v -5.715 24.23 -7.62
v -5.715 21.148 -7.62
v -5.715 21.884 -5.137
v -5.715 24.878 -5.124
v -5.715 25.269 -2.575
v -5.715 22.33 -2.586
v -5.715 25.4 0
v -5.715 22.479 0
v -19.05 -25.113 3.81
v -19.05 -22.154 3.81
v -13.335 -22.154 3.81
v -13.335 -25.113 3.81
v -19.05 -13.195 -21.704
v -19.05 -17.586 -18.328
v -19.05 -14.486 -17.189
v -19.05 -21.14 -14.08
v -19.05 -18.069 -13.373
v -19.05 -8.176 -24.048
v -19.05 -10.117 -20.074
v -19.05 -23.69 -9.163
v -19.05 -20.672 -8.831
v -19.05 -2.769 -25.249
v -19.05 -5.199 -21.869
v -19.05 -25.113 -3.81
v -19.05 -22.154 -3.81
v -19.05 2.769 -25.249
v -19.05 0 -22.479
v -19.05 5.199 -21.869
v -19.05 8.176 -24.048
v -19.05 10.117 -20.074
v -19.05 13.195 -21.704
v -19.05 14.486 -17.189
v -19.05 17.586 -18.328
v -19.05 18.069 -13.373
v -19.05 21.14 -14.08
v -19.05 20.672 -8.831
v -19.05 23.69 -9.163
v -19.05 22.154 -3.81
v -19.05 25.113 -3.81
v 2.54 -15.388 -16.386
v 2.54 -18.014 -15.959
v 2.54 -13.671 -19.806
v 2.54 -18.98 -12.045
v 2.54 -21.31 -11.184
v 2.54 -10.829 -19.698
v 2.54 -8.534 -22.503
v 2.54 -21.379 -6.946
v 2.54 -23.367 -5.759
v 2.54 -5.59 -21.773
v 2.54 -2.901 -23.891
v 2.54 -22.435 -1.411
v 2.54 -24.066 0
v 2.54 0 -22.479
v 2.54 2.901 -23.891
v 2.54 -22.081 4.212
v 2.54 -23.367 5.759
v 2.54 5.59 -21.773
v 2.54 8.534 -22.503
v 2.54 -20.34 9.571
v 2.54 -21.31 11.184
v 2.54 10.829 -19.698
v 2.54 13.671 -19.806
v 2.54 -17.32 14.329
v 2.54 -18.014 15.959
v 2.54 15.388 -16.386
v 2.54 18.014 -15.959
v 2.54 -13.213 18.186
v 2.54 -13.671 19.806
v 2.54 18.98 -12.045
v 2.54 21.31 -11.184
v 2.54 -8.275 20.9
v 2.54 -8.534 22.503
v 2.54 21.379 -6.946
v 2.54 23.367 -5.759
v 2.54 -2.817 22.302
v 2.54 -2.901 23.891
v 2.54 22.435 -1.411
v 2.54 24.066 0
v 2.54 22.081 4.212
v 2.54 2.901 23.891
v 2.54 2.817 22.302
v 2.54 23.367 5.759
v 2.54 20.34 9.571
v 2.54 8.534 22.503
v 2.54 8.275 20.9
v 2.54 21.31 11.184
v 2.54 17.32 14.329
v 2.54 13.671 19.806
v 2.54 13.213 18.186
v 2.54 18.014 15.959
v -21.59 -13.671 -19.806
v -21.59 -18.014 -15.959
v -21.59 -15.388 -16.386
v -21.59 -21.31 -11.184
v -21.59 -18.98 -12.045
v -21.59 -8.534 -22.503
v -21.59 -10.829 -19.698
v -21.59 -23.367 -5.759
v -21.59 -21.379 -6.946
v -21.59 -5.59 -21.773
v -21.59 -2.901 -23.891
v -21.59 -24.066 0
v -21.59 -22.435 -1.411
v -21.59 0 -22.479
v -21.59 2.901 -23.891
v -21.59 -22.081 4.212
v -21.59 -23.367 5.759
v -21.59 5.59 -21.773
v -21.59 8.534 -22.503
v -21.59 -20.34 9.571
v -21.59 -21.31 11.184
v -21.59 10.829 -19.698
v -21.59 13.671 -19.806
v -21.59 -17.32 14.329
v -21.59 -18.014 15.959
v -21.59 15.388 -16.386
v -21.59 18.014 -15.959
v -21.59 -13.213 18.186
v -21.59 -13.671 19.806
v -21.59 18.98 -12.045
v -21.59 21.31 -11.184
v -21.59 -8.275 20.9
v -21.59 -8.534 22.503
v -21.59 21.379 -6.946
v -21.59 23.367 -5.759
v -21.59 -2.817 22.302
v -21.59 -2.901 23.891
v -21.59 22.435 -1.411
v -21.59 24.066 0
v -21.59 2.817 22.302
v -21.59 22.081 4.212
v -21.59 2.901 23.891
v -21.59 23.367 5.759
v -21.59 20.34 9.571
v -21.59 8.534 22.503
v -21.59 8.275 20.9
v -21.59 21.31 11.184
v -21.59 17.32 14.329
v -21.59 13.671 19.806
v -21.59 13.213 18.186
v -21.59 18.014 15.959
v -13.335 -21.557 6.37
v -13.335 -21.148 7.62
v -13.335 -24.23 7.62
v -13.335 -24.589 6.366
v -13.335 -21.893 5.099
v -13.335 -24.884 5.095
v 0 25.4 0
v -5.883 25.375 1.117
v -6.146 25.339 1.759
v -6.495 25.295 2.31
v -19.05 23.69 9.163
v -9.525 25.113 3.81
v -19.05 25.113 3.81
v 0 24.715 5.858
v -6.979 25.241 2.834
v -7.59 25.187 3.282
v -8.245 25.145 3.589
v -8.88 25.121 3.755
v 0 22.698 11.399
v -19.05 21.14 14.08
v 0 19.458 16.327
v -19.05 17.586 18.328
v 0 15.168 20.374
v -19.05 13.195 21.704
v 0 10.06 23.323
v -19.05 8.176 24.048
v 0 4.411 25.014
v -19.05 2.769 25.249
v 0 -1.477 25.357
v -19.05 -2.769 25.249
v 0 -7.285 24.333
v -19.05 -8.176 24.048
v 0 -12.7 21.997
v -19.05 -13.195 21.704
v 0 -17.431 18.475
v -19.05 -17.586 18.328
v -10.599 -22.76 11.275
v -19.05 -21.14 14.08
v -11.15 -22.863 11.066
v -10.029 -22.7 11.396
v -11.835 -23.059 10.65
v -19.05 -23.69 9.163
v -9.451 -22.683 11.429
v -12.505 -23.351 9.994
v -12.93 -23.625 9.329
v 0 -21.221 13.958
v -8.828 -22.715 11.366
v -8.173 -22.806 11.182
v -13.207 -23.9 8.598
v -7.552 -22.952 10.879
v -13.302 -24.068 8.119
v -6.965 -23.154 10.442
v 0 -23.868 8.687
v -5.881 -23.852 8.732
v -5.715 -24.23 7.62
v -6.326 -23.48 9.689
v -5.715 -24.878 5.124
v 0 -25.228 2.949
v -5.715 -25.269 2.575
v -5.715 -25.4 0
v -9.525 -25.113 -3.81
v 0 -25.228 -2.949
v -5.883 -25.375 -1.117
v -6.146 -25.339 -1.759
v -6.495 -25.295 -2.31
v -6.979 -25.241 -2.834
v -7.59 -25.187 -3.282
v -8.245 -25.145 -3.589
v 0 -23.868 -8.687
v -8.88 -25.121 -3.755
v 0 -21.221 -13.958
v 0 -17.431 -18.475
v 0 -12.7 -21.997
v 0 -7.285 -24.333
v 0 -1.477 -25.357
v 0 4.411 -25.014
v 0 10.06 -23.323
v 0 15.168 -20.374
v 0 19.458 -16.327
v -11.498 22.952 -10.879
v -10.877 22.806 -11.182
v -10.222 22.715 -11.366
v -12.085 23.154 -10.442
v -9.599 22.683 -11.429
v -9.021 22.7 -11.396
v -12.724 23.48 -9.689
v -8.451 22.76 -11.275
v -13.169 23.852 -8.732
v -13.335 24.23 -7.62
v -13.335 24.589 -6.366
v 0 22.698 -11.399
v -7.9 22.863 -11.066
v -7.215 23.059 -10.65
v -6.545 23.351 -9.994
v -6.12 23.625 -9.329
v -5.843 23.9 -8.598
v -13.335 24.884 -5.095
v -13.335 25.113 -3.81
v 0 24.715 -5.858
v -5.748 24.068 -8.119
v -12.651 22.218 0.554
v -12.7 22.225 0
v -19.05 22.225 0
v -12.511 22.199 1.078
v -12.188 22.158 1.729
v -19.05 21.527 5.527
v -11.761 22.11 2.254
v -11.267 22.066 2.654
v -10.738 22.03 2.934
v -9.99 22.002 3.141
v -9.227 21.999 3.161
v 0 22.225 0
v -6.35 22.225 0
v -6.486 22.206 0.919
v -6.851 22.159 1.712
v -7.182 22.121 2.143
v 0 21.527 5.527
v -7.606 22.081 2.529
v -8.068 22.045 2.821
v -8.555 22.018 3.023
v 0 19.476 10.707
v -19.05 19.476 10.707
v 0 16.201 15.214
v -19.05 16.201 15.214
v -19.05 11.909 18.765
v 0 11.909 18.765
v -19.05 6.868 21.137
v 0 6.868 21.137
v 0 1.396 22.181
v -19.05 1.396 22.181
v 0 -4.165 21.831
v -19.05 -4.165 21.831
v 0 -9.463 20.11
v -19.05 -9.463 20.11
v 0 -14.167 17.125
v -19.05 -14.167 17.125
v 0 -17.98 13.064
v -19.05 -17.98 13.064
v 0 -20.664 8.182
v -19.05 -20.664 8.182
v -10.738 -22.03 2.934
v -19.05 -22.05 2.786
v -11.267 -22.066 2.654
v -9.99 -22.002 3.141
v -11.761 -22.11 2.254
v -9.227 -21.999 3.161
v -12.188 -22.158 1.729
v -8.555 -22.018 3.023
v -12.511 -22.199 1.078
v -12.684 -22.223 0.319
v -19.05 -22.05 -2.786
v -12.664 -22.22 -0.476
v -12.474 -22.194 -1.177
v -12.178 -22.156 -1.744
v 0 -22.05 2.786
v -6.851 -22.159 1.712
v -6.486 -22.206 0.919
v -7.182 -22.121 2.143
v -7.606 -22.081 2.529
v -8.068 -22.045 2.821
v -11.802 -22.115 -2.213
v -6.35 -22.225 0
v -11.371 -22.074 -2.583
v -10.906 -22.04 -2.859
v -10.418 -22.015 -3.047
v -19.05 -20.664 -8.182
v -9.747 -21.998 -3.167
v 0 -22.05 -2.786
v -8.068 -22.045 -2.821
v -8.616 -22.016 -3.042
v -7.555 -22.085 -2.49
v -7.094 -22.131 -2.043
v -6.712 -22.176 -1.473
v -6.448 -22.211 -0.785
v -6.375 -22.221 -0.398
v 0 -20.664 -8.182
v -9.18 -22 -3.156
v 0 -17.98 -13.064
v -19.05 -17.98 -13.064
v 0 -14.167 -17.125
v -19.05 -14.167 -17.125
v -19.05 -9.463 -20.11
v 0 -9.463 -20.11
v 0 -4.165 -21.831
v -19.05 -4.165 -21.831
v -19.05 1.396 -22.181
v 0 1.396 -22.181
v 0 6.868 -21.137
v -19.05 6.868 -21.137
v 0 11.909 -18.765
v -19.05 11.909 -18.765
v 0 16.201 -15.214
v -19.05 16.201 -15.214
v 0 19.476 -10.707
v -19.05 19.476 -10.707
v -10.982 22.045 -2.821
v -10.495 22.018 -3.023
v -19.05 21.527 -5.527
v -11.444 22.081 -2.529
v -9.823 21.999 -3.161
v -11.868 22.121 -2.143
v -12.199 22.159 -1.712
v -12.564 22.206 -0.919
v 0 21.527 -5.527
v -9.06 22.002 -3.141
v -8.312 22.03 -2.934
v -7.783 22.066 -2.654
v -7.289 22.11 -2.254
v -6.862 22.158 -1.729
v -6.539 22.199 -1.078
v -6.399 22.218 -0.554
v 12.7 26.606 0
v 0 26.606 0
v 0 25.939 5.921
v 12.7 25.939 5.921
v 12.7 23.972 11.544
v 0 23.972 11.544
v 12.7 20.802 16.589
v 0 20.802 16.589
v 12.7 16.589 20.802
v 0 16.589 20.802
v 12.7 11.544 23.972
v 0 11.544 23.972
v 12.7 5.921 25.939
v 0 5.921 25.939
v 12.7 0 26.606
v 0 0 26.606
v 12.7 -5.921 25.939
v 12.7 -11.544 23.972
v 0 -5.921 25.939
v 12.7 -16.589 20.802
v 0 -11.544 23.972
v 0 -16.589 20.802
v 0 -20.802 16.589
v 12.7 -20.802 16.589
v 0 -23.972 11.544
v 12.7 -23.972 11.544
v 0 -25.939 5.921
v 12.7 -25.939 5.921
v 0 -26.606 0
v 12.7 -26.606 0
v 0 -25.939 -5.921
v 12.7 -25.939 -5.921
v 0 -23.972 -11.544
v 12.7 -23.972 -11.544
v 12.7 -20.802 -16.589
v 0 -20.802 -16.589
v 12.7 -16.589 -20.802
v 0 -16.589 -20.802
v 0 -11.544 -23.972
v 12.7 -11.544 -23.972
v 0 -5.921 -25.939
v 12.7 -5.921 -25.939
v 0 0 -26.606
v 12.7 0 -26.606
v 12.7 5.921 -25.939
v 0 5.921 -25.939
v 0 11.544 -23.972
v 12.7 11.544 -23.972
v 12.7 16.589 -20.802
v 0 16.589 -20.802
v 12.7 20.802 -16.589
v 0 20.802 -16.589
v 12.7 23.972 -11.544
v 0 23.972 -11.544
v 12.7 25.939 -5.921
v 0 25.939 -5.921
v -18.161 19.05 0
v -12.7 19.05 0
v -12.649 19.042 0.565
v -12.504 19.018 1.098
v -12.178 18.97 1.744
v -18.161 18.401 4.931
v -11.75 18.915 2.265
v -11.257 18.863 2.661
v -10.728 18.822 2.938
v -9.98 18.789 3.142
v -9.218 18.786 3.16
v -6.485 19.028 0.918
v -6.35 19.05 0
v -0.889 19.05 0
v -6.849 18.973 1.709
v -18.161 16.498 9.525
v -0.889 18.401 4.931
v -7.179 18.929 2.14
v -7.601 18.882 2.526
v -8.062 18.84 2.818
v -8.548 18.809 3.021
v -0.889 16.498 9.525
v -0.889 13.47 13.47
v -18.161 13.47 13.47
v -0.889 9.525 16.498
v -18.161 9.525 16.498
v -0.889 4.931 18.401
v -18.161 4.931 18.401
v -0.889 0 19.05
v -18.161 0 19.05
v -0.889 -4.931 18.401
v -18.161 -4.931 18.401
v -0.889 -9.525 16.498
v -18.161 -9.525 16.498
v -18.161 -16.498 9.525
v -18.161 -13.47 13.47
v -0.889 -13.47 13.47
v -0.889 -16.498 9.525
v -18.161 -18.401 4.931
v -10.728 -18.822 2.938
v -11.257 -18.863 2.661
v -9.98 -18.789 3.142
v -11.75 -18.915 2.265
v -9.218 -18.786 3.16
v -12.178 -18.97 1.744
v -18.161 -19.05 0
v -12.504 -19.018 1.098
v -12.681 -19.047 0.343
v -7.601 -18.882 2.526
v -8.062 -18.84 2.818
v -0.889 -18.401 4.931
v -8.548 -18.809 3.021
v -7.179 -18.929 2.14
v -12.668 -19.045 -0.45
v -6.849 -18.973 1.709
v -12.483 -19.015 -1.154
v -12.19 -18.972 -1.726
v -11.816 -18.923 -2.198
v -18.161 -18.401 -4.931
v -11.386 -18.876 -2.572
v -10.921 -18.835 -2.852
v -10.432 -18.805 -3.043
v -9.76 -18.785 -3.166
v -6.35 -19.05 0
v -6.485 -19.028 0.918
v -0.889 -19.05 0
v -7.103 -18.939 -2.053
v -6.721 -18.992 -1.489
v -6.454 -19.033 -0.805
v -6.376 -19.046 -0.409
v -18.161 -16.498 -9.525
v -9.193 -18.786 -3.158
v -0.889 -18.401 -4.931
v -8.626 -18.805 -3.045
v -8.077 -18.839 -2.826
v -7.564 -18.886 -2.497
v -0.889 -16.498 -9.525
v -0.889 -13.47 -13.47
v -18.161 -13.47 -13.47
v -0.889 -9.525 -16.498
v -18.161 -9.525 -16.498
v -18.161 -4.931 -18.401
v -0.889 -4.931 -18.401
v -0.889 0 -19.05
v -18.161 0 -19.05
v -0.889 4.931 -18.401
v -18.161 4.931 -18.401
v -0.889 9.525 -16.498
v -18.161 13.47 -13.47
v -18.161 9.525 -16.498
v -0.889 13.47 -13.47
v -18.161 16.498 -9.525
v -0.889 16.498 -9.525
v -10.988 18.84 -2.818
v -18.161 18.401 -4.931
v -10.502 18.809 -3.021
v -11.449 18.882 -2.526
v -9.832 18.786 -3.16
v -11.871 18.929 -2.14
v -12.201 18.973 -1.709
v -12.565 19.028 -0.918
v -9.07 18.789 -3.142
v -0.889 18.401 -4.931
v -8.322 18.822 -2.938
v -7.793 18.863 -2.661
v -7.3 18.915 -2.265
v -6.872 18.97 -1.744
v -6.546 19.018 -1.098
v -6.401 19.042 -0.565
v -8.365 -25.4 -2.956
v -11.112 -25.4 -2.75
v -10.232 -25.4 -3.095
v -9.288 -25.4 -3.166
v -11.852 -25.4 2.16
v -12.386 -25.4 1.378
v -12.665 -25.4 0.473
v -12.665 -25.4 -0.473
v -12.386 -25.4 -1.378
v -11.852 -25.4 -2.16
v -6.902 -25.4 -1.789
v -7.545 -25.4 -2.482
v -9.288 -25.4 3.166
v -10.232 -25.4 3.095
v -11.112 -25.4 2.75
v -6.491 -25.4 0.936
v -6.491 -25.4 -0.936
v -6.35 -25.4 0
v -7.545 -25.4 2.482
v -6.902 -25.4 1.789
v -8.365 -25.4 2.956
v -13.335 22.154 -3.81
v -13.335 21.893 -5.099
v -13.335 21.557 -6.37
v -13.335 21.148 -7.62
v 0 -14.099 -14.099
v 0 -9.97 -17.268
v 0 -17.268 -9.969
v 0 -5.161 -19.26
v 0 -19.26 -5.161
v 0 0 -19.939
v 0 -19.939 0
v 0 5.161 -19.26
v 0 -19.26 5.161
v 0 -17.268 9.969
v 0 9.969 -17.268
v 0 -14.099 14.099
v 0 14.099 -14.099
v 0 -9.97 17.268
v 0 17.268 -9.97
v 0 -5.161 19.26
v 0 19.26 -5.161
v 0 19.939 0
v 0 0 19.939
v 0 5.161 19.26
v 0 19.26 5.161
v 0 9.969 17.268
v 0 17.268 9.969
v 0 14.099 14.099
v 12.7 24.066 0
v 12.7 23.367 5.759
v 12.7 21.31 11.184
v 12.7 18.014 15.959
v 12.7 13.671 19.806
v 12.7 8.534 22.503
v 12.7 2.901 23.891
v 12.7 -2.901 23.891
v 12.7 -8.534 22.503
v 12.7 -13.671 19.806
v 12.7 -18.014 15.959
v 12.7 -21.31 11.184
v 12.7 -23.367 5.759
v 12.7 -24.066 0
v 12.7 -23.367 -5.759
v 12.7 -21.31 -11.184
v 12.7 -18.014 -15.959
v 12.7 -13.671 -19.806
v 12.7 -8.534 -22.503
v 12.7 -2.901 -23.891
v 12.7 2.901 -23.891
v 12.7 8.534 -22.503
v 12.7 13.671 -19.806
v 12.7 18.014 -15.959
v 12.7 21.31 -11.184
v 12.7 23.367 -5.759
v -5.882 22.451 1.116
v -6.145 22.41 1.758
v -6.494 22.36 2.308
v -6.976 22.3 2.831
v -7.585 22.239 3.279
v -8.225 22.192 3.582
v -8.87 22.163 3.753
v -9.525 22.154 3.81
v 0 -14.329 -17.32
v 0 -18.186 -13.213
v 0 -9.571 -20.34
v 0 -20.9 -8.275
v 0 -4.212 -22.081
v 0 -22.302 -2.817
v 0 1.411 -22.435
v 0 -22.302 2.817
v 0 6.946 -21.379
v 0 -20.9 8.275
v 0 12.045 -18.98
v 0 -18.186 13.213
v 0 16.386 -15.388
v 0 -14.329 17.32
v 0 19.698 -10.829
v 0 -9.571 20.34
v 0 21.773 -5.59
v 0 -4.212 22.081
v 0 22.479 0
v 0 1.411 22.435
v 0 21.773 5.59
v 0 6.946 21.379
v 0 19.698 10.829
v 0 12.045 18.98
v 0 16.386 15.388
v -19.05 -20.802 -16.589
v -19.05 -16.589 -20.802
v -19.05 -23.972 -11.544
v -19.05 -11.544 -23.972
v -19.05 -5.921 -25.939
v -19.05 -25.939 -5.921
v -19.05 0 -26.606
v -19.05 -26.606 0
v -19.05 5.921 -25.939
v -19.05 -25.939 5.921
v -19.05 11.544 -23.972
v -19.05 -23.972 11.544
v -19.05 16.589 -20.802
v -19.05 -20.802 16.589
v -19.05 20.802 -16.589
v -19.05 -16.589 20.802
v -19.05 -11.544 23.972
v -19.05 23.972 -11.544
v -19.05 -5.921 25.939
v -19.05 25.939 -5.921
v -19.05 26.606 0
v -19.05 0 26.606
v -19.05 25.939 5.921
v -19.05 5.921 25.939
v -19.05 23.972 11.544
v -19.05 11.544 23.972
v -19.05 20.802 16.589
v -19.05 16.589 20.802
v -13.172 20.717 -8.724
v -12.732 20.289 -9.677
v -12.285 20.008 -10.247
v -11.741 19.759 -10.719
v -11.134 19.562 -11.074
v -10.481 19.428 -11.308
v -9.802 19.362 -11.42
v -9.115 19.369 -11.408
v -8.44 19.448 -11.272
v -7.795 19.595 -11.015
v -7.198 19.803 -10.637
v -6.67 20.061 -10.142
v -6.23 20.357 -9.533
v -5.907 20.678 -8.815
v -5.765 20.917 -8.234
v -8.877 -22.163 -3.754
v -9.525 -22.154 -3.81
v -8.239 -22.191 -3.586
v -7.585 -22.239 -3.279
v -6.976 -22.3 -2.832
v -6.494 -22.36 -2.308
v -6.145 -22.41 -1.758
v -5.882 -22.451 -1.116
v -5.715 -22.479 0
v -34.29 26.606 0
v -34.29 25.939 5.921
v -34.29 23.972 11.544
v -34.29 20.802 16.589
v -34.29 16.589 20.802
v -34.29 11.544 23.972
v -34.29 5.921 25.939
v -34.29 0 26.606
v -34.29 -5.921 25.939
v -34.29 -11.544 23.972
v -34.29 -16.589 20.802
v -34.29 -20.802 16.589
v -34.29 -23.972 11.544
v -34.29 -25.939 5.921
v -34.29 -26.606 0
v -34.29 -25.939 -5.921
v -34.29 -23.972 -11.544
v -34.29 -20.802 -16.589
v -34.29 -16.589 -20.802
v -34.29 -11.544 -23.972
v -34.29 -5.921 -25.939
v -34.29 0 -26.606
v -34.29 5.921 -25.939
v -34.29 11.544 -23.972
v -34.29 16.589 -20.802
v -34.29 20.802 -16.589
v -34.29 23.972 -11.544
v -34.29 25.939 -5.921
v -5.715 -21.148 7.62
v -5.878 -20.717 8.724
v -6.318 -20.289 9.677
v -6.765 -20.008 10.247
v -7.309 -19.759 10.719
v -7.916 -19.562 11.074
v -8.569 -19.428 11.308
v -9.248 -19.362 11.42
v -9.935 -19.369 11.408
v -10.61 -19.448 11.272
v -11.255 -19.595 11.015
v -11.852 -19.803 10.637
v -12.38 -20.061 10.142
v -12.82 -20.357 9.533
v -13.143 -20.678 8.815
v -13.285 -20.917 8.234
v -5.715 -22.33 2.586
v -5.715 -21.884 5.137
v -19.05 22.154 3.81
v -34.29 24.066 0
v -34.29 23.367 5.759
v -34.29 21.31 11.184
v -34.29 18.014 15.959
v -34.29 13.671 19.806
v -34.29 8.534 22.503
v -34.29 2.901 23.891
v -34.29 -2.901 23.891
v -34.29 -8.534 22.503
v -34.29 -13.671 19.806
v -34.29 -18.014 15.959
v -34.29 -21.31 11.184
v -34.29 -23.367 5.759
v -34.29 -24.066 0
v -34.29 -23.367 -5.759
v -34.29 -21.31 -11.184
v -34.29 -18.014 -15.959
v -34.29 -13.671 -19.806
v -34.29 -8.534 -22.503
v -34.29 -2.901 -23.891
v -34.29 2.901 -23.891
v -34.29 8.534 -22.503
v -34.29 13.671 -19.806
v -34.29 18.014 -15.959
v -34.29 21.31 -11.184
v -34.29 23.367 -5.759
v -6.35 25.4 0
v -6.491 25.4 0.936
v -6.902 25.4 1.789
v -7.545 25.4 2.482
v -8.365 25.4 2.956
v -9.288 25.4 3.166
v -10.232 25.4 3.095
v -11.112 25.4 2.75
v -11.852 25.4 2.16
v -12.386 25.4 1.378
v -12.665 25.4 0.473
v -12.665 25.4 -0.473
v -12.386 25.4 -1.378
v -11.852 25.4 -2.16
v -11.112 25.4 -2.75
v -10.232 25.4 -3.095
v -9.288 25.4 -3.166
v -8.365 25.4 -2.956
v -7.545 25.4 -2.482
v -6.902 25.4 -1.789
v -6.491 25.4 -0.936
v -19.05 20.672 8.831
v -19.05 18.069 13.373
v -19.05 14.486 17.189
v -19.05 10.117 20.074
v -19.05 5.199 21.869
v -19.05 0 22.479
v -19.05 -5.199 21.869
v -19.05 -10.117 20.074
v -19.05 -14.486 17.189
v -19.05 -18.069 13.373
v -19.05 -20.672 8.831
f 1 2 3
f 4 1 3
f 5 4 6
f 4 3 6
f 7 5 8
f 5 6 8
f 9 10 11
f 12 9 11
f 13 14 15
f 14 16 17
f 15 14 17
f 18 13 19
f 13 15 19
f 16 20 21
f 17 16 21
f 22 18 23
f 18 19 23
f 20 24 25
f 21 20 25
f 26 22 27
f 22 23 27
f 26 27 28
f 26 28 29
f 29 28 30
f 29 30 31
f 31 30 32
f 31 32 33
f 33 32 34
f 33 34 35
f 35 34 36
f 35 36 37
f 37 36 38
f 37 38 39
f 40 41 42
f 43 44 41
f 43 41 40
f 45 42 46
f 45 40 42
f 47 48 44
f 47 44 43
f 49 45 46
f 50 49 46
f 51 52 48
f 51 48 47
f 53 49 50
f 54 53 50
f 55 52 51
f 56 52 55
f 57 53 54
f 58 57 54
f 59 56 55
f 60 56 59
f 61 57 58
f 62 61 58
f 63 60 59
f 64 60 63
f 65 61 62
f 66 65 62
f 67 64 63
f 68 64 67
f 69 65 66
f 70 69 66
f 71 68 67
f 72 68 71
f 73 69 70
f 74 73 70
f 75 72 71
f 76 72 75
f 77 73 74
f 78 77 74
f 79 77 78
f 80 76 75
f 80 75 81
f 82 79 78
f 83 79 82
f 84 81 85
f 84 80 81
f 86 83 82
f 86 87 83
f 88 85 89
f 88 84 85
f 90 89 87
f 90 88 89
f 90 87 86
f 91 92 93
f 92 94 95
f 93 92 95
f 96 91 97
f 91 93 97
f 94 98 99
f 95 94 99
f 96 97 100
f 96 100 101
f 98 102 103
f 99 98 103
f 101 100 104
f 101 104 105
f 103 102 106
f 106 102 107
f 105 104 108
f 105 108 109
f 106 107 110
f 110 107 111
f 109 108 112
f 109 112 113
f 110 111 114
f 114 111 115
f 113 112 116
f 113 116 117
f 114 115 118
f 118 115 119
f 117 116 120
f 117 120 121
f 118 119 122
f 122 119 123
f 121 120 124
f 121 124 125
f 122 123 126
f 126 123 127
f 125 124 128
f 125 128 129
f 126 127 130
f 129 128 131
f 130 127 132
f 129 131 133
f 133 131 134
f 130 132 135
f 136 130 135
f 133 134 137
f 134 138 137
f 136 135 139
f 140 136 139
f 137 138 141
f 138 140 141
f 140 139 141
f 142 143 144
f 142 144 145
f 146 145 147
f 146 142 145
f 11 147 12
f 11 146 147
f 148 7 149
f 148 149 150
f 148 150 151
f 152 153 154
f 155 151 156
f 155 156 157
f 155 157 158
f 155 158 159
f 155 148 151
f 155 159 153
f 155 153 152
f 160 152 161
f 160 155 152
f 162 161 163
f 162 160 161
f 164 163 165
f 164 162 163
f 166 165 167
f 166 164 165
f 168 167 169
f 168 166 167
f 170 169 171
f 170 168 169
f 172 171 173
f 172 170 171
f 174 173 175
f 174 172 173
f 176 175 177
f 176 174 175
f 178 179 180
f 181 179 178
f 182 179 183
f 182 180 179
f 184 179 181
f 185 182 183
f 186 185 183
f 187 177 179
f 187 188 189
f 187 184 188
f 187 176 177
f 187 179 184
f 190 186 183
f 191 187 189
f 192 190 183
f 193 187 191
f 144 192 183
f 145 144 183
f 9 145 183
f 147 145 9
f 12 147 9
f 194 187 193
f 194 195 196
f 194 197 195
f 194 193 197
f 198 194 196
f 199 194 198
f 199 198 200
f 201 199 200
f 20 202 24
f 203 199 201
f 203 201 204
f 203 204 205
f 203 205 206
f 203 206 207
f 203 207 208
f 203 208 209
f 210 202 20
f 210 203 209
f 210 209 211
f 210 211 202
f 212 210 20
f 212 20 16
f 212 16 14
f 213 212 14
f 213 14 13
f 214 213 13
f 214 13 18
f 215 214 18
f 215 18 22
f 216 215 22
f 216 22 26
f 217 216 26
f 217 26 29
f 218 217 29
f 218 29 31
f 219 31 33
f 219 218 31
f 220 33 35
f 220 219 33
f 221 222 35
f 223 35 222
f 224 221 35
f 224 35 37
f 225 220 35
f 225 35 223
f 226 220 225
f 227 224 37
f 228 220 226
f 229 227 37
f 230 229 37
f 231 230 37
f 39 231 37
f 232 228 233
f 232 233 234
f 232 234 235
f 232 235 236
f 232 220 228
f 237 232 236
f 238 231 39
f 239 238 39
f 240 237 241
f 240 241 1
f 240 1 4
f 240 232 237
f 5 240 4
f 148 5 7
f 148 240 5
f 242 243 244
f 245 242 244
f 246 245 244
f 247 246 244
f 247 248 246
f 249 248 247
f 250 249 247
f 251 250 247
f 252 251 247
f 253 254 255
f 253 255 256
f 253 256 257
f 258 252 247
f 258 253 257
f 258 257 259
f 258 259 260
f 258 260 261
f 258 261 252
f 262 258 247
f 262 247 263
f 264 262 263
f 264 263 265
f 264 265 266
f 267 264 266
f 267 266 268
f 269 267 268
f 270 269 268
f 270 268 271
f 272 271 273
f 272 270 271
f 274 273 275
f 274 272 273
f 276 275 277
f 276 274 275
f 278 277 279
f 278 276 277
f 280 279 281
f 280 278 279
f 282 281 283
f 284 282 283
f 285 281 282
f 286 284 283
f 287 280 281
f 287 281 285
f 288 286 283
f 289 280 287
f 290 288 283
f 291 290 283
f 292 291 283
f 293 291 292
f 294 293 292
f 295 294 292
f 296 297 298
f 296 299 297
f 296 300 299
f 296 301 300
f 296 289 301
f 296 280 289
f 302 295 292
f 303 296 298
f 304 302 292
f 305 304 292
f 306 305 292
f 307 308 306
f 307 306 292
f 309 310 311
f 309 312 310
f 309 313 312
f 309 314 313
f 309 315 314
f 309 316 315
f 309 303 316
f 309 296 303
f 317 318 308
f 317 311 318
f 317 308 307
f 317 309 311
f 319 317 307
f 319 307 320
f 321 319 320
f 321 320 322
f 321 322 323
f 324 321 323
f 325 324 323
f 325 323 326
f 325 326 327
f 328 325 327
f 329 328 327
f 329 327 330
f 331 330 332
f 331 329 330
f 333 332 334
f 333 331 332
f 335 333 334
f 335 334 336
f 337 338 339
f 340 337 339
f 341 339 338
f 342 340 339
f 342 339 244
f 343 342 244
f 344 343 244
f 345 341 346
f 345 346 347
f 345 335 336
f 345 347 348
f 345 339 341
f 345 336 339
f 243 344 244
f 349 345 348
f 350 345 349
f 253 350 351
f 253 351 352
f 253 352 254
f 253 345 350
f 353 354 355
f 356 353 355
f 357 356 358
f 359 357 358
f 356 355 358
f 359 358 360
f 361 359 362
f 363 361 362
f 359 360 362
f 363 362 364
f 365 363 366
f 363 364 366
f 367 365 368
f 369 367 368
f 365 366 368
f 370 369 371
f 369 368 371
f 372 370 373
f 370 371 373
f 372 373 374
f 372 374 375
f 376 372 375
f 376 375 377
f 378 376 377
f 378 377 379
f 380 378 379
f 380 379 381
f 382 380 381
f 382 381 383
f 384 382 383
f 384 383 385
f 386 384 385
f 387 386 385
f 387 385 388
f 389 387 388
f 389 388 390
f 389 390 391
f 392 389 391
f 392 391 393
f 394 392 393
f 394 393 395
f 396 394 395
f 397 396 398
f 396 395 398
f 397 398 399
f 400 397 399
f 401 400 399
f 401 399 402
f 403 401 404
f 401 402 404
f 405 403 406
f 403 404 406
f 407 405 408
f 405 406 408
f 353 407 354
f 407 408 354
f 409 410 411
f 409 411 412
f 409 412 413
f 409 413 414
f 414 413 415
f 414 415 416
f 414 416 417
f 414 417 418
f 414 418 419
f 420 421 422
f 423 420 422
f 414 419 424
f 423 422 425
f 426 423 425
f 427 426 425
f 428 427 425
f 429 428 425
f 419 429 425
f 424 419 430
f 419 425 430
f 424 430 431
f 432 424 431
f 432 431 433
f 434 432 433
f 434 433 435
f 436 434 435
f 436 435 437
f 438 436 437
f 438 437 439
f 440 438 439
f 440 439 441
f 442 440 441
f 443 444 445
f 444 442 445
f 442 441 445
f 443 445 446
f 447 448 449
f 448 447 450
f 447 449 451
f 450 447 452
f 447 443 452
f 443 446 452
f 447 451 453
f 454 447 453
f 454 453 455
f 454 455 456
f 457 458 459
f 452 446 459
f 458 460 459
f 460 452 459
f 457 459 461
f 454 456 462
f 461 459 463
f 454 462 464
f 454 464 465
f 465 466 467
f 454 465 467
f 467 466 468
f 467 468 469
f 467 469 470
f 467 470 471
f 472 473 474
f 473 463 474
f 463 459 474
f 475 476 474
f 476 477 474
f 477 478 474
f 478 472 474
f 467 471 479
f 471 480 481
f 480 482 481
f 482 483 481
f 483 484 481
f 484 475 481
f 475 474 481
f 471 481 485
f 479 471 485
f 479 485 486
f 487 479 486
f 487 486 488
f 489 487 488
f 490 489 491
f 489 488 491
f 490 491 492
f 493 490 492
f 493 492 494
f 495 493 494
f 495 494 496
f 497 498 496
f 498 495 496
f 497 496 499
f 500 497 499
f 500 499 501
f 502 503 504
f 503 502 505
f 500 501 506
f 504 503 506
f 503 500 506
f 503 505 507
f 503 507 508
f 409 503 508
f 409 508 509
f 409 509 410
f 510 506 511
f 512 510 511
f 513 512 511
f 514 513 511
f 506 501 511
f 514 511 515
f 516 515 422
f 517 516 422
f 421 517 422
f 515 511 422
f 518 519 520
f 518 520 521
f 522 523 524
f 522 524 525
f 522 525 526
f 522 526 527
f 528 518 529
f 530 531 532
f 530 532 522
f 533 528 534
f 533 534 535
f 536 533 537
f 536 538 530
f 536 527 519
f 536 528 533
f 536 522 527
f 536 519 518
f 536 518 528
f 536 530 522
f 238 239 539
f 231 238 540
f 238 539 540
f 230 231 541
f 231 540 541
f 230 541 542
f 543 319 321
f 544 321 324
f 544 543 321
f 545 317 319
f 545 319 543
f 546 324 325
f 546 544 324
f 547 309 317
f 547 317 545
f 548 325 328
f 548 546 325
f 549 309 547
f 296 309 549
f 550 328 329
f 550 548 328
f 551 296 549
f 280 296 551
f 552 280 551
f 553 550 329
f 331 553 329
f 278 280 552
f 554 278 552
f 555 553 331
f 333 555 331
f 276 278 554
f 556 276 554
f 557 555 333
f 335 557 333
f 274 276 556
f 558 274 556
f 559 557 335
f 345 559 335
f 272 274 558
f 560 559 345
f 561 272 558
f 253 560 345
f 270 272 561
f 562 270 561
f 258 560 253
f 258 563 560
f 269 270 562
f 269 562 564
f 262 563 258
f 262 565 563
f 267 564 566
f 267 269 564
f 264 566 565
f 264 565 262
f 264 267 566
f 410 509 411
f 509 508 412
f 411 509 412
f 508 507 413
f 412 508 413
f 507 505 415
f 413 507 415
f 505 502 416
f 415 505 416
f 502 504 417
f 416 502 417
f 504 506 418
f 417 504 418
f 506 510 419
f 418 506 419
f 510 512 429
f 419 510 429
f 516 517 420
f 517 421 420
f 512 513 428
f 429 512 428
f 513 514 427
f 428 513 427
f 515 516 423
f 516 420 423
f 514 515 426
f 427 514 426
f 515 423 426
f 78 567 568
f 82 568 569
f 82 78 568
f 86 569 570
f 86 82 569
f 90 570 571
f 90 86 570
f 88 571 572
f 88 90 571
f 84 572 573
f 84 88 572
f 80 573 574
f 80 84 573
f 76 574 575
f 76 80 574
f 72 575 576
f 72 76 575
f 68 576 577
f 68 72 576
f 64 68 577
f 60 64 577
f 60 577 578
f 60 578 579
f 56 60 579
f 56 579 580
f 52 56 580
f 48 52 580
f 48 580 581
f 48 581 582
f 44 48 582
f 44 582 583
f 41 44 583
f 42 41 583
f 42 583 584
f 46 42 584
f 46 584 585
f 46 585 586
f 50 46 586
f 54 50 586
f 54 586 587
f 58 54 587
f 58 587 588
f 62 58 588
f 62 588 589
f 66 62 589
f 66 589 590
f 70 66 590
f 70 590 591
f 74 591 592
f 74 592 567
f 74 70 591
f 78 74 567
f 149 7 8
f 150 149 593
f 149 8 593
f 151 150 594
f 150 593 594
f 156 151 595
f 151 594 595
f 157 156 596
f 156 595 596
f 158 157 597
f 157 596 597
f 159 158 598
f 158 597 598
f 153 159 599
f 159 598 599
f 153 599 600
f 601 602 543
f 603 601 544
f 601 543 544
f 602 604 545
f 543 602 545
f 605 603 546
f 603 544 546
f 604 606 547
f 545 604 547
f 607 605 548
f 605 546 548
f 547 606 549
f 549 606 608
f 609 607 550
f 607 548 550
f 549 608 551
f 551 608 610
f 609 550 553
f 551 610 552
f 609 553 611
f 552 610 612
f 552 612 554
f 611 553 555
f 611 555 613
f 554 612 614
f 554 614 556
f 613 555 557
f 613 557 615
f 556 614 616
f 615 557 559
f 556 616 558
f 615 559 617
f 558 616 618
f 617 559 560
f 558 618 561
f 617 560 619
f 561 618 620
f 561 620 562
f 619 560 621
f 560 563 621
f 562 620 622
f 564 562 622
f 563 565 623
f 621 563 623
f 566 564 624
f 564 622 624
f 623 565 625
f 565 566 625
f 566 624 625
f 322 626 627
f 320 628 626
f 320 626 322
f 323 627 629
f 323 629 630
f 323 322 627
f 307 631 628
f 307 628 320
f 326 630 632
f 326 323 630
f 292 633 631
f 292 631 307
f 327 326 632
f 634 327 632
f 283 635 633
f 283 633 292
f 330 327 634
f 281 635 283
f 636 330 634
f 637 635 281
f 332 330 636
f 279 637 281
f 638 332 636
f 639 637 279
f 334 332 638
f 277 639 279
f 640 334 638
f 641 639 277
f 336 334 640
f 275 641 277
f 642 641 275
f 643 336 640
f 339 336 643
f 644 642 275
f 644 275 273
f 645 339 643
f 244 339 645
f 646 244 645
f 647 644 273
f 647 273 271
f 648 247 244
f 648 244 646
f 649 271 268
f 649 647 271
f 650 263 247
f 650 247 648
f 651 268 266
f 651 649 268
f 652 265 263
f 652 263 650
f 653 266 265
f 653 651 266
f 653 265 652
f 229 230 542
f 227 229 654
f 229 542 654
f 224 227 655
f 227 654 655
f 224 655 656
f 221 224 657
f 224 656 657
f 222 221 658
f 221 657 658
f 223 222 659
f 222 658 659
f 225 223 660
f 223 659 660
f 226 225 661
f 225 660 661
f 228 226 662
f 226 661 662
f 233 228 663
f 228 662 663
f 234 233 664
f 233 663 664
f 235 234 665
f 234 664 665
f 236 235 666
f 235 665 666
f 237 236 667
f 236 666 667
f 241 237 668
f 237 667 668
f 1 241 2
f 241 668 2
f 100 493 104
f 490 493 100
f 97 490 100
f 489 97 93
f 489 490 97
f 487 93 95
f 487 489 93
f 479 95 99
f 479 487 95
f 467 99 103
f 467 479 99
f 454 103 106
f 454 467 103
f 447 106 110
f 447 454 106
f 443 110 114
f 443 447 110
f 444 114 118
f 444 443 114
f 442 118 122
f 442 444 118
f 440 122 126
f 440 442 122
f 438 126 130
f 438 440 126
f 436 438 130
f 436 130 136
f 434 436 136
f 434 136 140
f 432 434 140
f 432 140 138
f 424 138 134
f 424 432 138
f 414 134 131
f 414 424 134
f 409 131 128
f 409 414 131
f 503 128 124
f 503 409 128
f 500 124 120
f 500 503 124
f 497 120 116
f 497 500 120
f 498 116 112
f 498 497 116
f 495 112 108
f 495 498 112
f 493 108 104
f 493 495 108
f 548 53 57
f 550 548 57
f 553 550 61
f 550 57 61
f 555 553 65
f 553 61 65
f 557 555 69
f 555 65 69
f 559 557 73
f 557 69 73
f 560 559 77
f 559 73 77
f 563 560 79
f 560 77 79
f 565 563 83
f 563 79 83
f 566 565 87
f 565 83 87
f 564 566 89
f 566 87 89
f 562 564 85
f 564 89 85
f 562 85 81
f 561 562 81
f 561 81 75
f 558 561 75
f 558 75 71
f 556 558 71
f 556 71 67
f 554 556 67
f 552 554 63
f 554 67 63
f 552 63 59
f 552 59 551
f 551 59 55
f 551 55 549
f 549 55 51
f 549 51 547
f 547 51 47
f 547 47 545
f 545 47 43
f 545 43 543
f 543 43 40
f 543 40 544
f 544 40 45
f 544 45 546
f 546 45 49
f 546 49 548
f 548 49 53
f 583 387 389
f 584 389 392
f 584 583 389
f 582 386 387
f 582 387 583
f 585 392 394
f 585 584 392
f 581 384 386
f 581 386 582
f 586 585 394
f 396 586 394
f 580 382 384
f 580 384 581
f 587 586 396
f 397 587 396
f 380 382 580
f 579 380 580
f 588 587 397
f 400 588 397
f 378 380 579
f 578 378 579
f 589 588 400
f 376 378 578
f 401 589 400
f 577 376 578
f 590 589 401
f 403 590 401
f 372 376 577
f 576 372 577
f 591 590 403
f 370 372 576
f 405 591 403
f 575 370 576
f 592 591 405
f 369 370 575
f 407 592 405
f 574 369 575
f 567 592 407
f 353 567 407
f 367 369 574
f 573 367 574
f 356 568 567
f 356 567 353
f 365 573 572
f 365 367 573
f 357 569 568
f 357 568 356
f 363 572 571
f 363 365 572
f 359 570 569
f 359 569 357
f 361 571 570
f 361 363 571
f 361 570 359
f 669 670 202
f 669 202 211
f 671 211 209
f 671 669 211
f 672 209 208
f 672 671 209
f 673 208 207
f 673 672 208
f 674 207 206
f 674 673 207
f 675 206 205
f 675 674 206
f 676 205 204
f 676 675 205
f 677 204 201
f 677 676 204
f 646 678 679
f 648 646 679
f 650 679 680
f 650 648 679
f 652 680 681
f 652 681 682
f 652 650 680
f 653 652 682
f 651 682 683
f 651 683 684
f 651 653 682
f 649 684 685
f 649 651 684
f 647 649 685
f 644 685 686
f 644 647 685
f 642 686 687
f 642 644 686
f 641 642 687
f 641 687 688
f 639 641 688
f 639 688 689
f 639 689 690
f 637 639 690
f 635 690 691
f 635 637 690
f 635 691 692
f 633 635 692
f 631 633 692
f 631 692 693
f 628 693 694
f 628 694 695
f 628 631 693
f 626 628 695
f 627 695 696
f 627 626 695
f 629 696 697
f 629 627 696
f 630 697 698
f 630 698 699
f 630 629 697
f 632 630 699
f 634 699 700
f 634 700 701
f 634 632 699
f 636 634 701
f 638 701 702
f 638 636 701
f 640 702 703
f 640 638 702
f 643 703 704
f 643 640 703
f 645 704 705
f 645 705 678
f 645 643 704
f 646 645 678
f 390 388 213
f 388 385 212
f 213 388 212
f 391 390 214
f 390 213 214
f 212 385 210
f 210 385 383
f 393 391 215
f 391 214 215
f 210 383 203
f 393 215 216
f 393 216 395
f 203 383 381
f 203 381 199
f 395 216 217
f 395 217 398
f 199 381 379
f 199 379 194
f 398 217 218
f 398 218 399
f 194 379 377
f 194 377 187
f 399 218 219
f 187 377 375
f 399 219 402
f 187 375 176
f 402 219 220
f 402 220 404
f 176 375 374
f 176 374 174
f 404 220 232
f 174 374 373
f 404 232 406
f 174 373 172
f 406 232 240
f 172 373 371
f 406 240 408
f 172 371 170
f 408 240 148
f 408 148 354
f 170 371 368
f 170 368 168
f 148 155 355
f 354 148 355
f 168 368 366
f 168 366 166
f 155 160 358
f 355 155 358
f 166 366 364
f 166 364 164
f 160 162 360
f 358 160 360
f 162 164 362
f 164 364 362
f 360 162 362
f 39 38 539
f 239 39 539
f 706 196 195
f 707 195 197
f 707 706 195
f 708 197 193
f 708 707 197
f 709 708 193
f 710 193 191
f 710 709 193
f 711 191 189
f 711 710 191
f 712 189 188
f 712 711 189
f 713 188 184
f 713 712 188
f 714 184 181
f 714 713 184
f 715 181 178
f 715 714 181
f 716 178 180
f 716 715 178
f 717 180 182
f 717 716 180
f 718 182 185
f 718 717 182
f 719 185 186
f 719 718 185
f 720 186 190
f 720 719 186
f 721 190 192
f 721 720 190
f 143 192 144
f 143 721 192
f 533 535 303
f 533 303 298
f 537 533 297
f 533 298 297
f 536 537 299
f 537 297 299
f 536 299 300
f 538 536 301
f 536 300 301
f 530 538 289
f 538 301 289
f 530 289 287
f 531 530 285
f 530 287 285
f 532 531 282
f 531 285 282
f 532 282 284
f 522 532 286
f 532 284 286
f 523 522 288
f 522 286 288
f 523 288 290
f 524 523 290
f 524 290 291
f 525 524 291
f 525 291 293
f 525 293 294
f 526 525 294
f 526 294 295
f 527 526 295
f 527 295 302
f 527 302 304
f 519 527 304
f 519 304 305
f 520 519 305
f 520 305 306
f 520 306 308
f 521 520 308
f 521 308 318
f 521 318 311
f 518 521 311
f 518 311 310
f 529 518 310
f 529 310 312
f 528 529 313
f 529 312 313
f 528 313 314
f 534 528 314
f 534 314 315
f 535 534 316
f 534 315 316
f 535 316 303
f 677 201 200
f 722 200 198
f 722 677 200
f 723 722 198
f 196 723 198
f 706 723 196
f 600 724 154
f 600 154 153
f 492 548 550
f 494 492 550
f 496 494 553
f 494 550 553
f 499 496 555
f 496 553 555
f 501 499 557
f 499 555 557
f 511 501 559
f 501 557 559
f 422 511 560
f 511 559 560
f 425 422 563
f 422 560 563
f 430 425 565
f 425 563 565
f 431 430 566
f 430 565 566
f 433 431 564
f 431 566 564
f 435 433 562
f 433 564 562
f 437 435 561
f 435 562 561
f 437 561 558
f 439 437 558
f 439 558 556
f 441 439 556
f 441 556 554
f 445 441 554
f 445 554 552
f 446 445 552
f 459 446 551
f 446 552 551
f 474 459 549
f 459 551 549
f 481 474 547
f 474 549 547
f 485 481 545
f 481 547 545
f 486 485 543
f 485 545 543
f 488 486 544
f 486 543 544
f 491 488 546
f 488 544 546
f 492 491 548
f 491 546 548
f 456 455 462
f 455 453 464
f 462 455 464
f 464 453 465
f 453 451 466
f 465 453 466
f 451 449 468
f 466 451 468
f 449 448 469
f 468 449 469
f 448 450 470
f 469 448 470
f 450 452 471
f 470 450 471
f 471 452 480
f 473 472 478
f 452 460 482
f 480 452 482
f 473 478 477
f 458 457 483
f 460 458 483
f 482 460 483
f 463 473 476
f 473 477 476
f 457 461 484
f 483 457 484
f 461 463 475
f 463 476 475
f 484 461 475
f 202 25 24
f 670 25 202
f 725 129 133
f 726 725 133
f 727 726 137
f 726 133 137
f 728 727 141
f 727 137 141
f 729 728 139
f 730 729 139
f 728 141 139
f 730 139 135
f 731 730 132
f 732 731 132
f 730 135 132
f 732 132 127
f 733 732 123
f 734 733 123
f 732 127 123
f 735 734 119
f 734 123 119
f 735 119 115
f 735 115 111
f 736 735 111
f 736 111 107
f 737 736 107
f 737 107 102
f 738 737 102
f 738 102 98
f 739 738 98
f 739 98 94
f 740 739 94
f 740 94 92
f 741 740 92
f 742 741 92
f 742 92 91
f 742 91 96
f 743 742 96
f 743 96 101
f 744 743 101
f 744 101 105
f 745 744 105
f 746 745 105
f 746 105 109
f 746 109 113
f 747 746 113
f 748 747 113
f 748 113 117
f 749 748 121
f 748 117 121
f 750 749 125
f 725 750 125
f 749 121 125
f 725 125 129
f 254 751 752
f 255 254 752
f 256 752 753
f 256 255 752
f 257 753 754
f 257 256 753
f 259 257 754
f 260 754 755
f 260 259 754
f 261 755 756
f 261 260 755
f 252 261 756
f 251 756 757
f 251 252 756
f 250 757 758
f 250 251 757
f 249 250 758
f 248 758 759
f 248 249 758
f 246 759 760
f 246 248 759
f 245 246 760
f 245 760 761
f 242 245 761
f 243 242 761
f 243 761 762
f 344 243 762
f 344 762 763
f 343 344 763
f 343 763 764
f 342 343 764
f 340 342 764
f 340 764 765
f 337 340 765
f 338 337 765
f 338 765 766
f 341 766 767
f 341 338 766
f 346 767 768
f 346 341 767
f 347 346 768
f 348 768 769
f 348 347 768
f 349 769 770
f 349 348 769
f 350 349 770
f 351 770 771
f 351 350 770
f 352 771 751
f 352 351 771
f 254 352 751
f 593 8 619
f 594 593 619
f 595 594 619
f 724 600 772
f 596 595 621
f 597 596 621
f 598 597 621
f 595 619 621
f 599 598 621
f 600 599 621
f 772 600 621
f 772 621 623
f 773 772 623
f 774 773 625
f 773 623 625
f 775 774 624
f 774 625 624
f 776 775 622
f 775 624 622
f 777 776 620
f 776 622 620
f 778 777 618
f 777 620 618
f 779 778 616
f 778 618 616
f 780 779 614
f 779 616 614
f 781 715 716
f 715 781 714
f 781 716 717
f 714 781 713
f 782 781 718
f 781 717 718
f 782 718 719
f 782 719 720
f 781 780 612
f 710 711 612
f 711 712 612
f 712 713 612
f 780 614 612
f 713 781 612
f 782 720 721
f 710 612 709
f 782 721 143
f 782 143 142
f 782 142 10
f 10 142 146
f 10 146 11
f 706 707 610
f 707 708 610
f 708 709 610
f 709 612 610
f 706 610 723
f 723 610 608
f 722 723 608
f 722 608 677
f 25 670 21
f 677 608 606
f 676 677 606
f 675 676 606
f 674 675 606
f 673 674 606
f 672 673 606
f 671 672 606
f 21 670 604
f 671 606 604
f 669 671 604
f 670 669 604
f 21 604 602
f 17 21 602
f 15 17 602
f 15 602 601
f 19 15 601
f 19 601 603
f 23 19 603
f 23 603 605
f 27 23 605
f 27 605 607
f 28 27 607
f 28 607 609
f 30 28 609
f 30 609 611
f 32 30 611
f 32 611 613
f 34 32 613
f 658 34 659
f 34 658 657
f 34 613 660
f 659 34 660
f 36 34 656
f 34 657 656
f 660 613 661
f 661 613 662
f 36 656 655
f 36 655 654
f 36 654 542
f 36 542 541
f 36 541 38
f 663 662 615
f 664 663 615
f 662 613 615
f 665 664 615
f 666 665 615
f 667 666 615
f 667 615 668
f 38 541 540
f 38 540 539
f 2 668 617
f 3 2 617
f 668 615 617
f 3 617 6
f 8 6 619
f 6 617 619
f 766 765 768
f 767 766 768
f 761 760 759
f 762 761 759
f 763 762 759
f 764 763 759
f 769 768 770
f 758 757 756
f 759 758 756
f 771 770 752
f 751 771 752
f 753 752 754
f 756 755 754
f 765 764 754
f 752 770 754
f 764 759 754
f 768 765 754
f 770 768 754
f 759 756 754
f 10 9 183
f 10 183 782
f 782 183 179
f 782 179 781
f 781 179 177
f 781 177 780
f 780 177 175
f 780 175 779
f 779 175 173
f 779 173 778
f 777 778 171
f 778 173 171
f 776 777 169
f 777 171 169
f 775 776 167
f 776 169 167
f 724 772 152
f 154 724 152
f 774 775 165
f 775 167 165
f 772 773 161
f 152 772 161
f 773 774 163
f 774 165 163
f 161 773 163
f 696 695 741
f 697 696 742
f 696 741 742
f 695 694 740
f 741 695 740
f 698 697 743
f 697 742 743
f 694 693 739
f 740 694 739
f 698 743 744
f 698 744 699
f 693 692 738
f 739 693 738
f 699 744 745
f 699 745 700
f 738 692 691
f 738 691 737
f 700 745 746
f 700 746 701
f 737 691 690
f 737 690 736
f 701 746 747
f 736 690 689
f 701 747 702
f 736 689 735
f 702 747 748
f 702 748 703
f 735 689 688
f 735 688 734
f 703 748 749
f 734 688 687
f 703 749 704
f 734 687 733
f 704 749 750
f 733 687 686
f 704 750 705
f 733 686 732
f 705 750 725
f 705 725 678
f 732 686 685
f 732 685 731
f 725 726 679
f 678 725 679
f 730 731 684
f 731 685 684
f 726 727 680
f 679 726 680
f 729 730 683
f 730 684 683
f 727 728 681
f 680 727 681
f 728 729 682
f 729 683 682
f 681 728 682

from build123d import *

# Parameters (mm, degrees)
F0_R           = 26.6065
F0_R_2         = 24.0665
F0_R_3         = 19.05
F1_DEPTH       = 2.54
F2_DEPTH       = 12.7
F3_R           = 25.4
F3_R_2         = 22.479
F4_DEPTH       = 19.05
F5_W           = 9.525
F5_H           = 7.62
F6_DEPTH       = 50.8
F6_DEPTH_BACK  = 50.8
F7_R           = 3.81
F8_DEPTH       = 50.8
F8_DEPTH_BACK  = 50.8
F10_DEPTH      = 50.8
F12_DEPTH      = 25.4
F13_R          = 22.225
F13_R_2        = 19.05
F14_DEPTH      = 21.59
F15_START      = -19.05
F13_R_3        = 24.0665
F15_DEPTH      = 2.54
F17_START      = -19.05
F16_R          = 26.6065
F16_R_2        = 24.0665
F17_DEPTH      = 15.24
F18_R          = 3.175
F19_DEPTH      = 25.4
F19_DEPTH_BACK = 25.4
F20_DEPTH      = 25.4
F21_W          = 2.54
F21_H          = 0.889


with BuildPart() as f1:
    # F0 (on Right) → F1 (new body)
    with BuildSketch(Plane.YZ):
        Circle(F0_R)
        Circle(F0_R_2, mode=Mode.SUBTRACT)
        Circle(F0_R_2)
        Circle(F0_R_3, mode=Mode.SUBTRACT)
    extrude(amount=F1_DEPTH)

    # F0 (on Right) → F2 (join)
    with BuildSketch(Plane.YZ):
        Circle(F0_R)
        Circle(F0_R_2, mode=Mode.SUBTRACT)
    extrude(amount=F2_DEPTH)

    # F3 (on Right) → F4 (join)
    with BuildSketch(Plane.YZ):
        Circle(F3_R)
        Circle(F3_R_2, mode=Mode.SUBTRACT)
    extrude(amount=-F4_DEPTH)

    # F5 (on Front) → F6 (cut, two sides)
    with BuildSketch(Plane.XZ) as f6_sk:
        with Locations((-14.2875, 0)):
            Rectangle(F5_W, F5_H)
    extrude(amount=-F6_DEPTH, mode=Mode.SUBTRACT)
    extrude(f6_sk.sketch, amount=F6_DEPTH_BACK, mode=Mode.SUBTRACT)

    # F7 (on Front) → F8 (cut, two sides)
    with BuildSketch(Plane.XZ) as f8_sk:
        with Locations((-9.525, 0)):
            Circle(F7_R)
    extrude(amount=-F8_DEPTH, mode=Mode.SUBTRACT)
    extrude(f8_sk.sketch, amount=F8_DEPTH_BACK, mode=Mode.SUBTRACT)

    # F9 (on Front) → F10 (cut)
    with BuildSketch(Plane.XZ):
        with BuildLine():
            ThreePointArc((-13.335, 7.62), (-9.525, 3.81), (-5.715, 7.62))
            ThreePointArc((-5.715, 7.62), (-9.525, 11.43), (-13.335, 7.62))
        make_face()
        with BuildLine():
            Line((-5.715, 0), (-5.715, 7.62))
            ThreePointArc((-5.715, 7.62), (-9.525, 3.81), (-13.335, 7.62))
            Line((-13.335, 7.62), (-13.335, 0))
            Line((-13.335, 0), (-5.715, 0))
        make_face()
    extrude(amount=F10_DEPTH, mode=Mode.SUBTRACT)

    # F11 (on Front) → F12 (cut)
    with BuildSketch(Plane.XZ):
        with BuildLine():
            ThreePointArc((-13.335, -7.62), (-9.525, -3.81), (-5.715, -7.62))
            Line((-5.715, -7.62), (-5.715, 0))
            Line((-5.715, 0), (-13.335, 0))
            Line((-13.335, 0), (-13.335, -7.62))
        make_face()
        with BuildLine():
            ThreePointArc((-13.335, -7.62), (-9.525, -11.43), (-5.715, -7.62))
            ThreePointArc((-5.715, -7.62), (-9.525, -3.81), (-13.335, -7.62))
        make_face()
    extrude(amount=-F12_DEPTH, mode=Mode.SUBTRACT)


with BuildPart() as f14:
    # F13 (on Right) → F14 (new body)
    with BuildSketch(Plane.YZ):
        Circle(F13_R)
        Circle(F13_R_2, mode=Mode.SUBTRACT)
    extrude(amount=-F14_DEPTH)

    # F13 (on Right) → F15 (join)
    with BuildSketch(Plane.YZ.offset(F15_START)):
        Circle(F13_R_3)
        Circle(F13_R, mode=Mode.SUBTRACT)
    extrude(amount=-F15_DEPTH)

    # F16 (on Right) → F17 (join)
    with BuildSketch(Plane.YZ.offset(F17_START)):
        Circle(F16_R)
        Circle(F16_R_2, mode=Mode.SUBTRACT)
    extrude(amount=-F17_DEPTH)

    # F18 (on Front) → F19 (join, two sides)
    with BuildSketch(Plane.XZ) as f19_sk:
        with Locations((-9.525, 0)):
            Circle(F18_R)
    extrude(amount=F19_DEPTH)
    extrude(f19_sk.sketch, amount=-F19_DEPTH_BACK)

    # F13 (on Right) → F20 (cut)
    with BuildSketch(Plane.YZ):
        Circle(F13_R_2)
    extrude(amount=-F20_DEPTH, mode=Mode.SUBTRACT)


with BuildPart() as f22_tool:
    # F21 (on Front) → F22 (revolve)
    with BuildSketch(Plane.XZ):
        Polygon((0, -19.939), (2.54, -22.479), (2.54, -19.939), align=None)
        with Locations((1.27, -19.4945)):
            Rectangle(F21_W, F21_H)
        Polygon((-0.889, -19.05), (0, -19.939), (0, -19.05), align=None)
    revolve(axis=Axis((12.2344479781, 0, 0), (1, 0, 0)))


with BuildPart() as f1_1:
    add(f1.part)

    # F22: cut by f22_tool
    add(f22_tool.part, mode=Mode.SUBTRACT)

    # F21 (on Front) → F25 (revolve, cut)
    with BuildSketch(Plane.XZ):
        Polygon((0, -19.939), (2.54, -22.479), (2.54, -19.939), align=None)
        with Locations((1.27, -19.4945)):
            Rectangle(F21_W, F21_H)
        Polygon((-0.889, -19.05), (0, -19.939), (0, -19.05), align=None)
    revolve(axis=Axis((12.2344479781, 0, 0), (1, 0, 0)), mode=Mode.SUBTRACT)


with BuildPart() as f14_1:
    add(f14.part)

    # F22: cut by f22_tool
    add(f22_tool.part, mode=Mode.SUBTRACT)

    # F23 (on Front) → F24 (revolve, cut)
    with BuildSketch(Plane.XZ):
        Polygon((-18.161, -19.05), (-21.59, -19.05), (-21.59, -22.479), align=None)
    revolve(axis=Axis((-10.795, 0, 0), (-1, 0, 0)), mode=Mode.SUBTRACT)


solid = Compound([f1_1.part, f14_1.part])
